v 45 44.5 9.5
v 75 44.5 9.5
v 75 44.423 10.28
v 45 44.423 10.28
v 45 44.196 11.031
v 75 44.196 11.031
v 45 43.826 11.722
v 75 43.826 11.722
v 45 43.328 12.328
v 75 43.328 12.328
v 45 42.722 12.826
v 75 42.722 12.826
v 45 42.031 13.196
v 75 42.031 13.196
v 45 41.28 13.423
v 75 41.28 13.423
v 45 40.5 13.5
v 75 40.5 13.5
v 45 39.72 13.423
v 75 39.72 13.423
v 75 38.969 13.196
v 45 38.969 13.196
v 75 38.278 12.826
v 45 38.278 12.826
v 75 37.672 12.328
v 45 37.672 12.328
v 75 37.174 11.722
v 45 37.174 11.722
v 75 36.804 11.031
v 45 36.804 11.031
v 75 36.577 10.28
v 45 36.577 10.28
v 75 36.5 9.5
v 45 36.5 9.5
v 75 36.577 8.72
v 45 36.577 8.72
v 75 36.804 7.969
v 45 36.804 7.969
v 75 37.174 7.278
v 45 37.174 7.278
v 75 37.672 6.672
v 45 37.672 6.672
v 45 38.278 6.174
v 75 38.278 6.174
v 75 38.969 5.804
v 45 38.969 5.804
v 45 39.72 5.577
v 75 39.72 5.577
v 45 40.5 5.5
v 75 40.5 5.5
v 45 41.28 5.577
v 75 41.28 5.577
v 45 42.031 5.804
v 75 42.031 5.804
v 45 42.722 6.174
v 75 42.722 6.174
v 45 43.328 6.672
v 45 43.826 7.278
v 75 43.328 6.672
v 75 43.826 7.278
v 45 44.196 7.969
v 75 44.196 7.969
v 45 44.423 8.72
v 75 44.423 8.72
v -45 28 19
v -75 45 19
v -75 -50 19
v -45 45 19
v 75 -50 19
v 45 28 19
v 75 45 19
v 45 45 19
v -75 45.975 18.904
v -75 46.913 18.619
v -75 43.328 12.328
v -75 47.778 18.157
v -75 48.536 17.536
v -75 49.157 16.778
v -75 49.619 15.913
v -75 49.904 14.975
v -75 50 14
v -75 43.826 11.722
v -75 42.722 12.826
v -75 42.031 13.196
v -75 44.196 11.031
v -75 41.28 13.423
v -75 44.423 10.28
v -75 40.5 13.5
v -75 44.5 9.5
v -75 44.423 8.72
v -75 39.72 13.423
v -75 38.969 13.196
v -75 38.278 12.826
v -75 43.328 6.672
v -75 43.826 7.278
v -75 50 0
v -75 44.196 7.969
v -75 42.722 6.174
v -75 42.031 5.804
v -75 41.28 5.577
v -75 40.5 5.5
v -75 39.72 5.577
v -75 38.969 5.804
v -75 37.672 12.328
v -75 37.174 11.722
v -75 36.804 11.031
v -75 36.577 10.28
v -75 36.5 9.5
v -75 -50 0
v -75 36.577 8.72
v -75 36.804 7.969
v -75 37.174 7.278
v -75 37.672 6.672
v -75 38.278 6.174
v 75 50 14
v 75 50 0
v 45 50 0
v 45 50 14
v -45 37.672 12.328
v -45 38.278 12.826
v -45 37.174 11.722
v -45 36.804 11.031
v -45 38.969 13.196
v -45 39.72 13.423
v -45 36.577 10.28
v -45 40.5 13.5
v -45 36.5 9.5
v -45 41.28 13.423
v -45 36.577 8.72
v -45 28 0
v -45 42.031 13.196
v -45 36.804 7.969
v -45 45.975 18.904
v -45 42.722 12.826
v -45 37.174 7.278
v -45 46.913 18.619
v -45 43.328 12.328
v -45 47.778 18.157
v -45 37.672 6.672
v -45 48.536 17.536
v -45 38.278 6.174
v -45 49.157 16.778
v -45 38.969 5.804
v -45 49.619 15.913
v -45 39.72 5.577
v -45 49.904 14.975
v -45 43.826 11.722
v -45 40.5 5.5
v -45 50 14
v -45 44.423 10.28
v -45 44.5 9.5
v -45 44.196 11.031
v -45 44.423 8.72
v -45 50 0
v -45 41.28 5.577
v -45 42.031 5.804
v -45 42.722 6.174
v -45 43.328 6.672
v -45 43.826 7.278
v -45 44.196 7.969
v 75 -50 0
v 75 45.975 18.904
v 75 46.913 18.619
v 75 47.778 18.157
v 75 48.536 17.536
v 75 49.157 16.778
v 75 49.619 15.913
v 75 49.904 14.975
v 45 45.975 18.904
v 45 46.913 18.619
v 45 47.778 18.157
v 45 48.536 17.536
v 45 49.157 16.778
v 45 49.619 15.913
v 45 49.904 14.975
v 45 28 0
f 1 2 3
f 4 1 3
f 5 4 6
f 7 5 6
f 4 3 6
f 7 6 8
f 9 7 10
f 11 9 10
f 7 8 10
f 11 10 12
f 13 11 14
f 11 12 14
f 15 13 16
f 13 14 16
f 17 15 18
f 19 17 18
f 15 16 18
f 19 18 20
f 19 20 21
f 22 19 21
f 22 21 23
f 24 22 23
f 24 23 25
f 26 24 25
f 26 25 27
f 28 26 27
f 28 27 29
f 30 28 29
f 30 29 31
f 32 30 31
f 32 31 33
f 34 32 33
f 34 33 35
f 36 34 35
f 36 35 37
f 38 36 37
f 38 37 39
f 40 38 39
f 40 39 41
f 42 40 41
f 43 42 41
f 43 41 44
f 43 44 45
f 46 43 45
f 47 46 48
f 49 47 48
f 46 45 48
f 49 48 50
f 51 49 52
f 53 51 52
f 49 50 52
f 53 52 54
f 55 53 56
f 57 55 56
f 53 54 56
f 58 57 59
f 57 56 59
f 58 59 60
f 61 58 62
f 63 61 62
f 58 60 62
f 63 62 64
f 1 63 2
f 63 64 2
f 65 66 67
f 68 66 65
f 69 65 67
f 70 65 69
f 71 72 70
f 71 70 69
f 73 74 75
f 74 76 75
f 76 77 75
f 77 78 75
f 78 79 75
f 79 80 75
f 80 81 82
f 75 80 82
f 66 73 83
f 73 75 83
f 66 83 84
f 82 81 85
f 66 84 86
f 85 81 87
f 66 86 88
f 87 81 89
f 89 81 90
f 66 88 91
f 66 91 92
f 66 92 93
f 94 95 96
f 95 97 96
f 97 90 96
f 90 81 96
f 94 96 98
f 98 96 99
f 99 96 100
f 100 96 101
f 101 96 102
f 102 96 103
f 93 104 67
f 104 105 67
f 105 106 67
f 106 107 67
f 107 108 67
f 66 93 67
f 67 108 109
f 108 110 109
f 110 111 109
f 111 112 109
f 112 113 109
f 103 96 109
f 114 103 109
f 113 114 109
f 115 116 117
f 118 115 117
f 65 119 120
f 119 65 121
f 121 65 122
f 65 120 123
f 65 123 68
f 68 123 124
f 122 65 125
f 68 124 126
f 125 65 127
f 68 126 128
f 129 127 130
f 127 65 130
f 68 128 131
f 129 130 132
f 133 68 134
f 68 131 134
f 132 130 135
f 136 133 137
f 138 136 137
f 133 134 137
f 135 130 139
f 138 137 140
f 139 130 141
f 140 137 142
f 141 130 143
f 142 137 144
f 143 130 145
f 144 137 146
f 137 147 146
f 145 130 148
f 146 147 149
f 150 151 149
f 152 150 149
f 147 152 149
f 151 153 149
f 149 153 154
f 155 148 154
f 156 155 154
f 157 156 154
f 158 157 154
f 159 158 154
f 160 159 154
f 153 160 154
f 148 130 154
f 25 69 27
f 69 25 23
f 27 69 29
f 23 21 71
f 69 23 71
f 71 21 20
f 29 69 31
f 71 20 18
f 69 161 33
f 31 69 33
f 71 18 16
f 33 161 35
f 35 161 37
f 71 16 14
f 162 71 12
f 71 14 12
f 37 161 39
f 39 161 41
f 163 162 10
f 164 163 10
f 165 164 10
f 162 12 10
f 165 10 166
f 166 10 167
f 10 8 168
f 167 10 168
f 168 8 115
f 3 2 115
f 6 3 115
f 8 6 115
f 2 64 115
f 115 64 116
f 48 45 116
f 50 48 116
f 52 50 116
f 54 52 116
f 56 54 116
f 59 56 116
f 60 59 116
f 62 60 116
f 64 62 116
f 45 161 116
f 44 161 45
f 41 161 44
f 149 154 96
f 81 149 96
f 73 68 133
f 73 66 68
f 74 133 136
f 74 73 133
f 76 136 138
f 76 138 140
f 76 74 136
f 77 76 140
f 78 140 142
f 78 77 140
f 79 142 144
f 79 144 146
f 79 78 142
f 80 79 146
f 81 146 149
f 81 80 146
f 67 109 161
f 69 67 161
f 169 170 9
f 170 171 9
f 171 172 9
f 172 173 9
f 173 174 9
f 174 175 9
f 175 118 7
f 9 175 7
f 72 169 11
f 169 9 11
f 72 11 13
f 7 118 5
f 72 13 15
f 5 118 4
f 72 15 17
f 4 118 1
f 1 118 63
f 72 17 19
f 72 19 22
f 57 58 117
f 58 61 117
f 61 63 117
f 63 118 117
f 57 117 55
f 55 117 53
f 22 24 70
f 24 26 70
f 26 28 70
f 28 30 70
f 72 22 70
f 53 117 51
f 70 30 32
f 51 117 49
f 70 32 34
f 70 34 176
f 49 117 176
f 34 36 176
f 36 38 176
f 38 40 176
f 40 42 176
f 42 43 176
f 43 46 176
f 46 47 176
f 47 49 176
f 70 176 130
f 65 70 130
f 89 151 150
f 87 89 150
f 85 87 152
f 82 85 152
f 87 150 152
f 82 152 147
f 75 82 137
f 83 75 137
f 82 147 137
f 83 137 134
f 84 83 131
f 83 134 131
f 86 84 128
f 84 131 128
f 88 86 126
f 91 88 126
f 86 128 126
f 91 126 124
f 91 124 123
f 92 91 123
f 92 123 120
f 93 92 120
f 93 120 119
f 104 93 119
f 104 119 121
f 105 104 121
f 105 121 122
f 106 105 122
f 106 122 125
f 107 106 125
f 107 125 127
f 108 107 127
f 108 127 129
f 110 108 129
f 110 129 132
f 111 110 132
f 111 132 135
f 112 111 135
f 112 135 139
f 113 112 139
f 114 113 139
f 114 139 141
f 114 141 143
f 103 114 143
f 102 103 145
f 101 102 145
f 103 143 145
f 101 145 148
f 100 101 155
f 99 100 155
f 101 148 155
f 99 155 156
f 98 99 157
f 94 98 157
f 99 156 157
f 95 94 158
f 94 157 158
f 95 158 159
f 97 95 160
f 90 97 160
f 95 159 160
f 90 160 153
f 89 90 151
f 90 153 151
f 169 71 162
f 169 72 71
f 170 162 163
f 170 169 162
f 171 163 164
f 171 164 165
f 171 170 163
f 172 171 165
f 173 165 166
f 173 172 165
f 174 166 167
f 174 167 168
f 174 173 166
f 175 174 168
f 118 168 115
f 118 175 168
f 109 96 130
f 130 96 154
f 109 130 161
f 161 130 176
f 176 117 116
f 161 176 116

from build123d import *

# Parameters (mm, degrees)
F1_DEPTH = 19
F2_R     = 4
F3_DEPTH = 150.001
F4_R     = 5


with BuildPart() as f1:
    # F0 (on Top) → F1 (new body)
    with BuildSketch(Plane.XY):
        Polygon((-75, -50), (75, -50), (75, 50), (45, 50), (45, 28), (-45, 28), (-45, 50), (-75, 50), align=None)
    extrude(amount=F1_DEPTH)

    # F2 (on face) → F3 (cut, through all)
    with BuildSketch(Plane.YZ.offset(75)):
        with Locations((40.5, 9.5)):
            Circle(F2_R)
    extrude(amount=-F3_DEPTH, mode=Mode.SUBTRACT)

    # F4
    f4_edges = [f1.edges().sort_by_distance(p)[0] for p in [
        (-60, 50, 19),
        (60, 50, 19),
    ]]
    fillet(f4_edges, radius=F4_R)


solid = f1.part
